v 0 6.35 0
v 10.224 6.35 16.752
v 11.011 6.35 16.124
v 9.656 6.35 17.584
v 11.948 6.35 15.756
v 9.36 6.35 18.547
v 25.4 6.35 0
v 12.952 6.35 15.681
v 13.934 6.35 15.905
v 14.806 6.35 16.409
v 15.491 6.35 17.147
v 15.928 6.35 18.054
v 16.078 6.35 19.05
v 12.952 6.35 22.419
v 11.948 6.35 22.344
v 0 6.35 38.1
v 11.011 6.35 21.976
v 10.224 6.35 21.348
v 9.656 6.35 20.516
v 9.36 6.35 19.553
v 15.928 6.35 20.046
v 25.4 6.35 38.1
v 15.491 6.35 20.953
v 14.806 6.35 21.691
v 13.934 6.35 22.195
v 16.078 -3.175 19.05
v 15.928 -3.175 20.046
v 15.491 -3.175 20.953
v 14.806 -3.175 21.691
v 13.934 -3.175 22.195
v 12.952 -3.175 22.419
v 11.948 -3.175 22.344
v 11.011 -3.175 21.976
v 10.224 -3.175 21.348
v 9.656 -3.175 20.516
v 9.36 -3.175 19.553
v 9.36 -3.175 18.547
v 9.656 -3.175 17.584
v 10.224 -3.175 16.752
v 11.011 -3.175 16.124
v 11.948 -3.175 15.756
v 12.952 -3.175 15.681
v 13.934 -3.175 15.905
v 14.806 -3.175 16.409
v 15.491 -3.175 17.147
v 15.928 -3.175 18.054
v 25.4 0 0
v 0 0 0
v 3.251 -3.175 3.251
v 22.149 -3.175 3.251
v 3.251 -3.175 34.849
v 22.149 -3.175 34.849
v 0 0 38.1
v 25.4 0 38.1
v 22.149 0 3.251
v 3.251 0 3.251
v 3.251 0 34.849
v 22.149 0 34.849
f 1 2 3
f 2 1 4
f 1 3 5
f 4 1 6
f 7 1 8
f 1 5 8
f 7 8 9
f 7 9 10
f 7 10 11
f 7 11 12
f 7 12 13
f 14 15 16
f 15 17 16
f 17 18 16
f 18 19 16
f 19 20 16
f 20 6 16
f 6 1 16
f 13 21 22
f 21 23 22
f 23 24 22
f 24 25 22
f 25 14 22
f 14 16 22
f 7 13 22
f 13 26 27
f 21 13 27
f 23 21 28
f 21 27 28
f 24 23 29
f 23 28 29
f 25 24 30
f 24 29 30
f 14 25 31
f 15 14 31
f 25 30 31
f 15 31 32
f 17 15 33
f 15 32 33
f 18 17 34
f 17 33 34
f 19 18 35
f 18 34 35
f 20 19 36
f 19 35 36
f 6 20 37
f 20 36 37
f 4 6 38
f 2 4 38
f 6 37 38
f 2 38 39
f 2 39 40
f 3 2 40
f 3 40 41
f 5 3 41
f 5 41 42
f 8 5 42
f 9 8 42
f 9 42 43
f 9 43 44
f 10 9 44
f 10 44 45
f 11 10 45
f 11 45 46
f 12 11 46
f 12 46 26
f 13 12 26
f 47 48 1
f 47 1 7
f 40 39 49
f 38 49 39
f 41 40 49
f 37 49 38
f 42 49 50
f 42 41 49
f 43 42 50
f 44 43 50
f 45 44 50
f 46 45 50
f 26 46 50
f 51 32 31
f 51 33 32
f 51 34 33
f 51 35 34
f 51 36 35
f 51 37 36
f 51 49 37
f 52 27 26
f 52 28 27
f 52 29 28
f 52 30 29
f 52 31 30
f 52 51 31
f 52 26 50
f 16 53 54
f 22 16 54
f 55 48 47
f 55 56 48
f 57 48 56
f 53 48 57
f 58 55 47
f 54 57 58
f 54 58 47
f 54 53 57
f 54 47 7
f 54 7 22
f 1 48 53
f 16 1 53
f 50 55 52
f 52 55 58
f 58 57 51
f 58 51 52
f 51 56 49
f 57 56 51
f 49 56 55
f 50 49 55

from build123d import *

# Parameters (mm, degrees)
F0_W     = 25.4
F0_H     = 38.1
F1_DEPTH = 6.35
F2_W     = 18.8976
F2_H     = 31.5976
F3_DEPTH = 3.175
F4_R     = 3.3782
F5_DEPTH = 25.4


with BuildPart() as f1:
    # F0 (on Front) → F1 (new body)
    with BuildSketch(Plane.XZ):
        with Locations((12.7, 19.05)):
            Rectangle(F0_W, F0_H)
    extrude(amount=-F1_DEPTH)

    # F2 (on face) → F3 (join)
    with BuildSketch(Plane.XZ):
        with Locations((12.7, 19.05)):
            Rectangle(F2_W, F2_H)
    extrude(amount=F3_DEPTH)

    # F4 (on face) → F5 (cut)
    with BuildSketch(Plane.XZ.offset(3.175)):
        with Locations((12.7, 19.05)):
            Circle(F4_R)
    extrude(amount=-F5_DEPTH, mode=Mode.SUBTRACT)


solid = f1.part
